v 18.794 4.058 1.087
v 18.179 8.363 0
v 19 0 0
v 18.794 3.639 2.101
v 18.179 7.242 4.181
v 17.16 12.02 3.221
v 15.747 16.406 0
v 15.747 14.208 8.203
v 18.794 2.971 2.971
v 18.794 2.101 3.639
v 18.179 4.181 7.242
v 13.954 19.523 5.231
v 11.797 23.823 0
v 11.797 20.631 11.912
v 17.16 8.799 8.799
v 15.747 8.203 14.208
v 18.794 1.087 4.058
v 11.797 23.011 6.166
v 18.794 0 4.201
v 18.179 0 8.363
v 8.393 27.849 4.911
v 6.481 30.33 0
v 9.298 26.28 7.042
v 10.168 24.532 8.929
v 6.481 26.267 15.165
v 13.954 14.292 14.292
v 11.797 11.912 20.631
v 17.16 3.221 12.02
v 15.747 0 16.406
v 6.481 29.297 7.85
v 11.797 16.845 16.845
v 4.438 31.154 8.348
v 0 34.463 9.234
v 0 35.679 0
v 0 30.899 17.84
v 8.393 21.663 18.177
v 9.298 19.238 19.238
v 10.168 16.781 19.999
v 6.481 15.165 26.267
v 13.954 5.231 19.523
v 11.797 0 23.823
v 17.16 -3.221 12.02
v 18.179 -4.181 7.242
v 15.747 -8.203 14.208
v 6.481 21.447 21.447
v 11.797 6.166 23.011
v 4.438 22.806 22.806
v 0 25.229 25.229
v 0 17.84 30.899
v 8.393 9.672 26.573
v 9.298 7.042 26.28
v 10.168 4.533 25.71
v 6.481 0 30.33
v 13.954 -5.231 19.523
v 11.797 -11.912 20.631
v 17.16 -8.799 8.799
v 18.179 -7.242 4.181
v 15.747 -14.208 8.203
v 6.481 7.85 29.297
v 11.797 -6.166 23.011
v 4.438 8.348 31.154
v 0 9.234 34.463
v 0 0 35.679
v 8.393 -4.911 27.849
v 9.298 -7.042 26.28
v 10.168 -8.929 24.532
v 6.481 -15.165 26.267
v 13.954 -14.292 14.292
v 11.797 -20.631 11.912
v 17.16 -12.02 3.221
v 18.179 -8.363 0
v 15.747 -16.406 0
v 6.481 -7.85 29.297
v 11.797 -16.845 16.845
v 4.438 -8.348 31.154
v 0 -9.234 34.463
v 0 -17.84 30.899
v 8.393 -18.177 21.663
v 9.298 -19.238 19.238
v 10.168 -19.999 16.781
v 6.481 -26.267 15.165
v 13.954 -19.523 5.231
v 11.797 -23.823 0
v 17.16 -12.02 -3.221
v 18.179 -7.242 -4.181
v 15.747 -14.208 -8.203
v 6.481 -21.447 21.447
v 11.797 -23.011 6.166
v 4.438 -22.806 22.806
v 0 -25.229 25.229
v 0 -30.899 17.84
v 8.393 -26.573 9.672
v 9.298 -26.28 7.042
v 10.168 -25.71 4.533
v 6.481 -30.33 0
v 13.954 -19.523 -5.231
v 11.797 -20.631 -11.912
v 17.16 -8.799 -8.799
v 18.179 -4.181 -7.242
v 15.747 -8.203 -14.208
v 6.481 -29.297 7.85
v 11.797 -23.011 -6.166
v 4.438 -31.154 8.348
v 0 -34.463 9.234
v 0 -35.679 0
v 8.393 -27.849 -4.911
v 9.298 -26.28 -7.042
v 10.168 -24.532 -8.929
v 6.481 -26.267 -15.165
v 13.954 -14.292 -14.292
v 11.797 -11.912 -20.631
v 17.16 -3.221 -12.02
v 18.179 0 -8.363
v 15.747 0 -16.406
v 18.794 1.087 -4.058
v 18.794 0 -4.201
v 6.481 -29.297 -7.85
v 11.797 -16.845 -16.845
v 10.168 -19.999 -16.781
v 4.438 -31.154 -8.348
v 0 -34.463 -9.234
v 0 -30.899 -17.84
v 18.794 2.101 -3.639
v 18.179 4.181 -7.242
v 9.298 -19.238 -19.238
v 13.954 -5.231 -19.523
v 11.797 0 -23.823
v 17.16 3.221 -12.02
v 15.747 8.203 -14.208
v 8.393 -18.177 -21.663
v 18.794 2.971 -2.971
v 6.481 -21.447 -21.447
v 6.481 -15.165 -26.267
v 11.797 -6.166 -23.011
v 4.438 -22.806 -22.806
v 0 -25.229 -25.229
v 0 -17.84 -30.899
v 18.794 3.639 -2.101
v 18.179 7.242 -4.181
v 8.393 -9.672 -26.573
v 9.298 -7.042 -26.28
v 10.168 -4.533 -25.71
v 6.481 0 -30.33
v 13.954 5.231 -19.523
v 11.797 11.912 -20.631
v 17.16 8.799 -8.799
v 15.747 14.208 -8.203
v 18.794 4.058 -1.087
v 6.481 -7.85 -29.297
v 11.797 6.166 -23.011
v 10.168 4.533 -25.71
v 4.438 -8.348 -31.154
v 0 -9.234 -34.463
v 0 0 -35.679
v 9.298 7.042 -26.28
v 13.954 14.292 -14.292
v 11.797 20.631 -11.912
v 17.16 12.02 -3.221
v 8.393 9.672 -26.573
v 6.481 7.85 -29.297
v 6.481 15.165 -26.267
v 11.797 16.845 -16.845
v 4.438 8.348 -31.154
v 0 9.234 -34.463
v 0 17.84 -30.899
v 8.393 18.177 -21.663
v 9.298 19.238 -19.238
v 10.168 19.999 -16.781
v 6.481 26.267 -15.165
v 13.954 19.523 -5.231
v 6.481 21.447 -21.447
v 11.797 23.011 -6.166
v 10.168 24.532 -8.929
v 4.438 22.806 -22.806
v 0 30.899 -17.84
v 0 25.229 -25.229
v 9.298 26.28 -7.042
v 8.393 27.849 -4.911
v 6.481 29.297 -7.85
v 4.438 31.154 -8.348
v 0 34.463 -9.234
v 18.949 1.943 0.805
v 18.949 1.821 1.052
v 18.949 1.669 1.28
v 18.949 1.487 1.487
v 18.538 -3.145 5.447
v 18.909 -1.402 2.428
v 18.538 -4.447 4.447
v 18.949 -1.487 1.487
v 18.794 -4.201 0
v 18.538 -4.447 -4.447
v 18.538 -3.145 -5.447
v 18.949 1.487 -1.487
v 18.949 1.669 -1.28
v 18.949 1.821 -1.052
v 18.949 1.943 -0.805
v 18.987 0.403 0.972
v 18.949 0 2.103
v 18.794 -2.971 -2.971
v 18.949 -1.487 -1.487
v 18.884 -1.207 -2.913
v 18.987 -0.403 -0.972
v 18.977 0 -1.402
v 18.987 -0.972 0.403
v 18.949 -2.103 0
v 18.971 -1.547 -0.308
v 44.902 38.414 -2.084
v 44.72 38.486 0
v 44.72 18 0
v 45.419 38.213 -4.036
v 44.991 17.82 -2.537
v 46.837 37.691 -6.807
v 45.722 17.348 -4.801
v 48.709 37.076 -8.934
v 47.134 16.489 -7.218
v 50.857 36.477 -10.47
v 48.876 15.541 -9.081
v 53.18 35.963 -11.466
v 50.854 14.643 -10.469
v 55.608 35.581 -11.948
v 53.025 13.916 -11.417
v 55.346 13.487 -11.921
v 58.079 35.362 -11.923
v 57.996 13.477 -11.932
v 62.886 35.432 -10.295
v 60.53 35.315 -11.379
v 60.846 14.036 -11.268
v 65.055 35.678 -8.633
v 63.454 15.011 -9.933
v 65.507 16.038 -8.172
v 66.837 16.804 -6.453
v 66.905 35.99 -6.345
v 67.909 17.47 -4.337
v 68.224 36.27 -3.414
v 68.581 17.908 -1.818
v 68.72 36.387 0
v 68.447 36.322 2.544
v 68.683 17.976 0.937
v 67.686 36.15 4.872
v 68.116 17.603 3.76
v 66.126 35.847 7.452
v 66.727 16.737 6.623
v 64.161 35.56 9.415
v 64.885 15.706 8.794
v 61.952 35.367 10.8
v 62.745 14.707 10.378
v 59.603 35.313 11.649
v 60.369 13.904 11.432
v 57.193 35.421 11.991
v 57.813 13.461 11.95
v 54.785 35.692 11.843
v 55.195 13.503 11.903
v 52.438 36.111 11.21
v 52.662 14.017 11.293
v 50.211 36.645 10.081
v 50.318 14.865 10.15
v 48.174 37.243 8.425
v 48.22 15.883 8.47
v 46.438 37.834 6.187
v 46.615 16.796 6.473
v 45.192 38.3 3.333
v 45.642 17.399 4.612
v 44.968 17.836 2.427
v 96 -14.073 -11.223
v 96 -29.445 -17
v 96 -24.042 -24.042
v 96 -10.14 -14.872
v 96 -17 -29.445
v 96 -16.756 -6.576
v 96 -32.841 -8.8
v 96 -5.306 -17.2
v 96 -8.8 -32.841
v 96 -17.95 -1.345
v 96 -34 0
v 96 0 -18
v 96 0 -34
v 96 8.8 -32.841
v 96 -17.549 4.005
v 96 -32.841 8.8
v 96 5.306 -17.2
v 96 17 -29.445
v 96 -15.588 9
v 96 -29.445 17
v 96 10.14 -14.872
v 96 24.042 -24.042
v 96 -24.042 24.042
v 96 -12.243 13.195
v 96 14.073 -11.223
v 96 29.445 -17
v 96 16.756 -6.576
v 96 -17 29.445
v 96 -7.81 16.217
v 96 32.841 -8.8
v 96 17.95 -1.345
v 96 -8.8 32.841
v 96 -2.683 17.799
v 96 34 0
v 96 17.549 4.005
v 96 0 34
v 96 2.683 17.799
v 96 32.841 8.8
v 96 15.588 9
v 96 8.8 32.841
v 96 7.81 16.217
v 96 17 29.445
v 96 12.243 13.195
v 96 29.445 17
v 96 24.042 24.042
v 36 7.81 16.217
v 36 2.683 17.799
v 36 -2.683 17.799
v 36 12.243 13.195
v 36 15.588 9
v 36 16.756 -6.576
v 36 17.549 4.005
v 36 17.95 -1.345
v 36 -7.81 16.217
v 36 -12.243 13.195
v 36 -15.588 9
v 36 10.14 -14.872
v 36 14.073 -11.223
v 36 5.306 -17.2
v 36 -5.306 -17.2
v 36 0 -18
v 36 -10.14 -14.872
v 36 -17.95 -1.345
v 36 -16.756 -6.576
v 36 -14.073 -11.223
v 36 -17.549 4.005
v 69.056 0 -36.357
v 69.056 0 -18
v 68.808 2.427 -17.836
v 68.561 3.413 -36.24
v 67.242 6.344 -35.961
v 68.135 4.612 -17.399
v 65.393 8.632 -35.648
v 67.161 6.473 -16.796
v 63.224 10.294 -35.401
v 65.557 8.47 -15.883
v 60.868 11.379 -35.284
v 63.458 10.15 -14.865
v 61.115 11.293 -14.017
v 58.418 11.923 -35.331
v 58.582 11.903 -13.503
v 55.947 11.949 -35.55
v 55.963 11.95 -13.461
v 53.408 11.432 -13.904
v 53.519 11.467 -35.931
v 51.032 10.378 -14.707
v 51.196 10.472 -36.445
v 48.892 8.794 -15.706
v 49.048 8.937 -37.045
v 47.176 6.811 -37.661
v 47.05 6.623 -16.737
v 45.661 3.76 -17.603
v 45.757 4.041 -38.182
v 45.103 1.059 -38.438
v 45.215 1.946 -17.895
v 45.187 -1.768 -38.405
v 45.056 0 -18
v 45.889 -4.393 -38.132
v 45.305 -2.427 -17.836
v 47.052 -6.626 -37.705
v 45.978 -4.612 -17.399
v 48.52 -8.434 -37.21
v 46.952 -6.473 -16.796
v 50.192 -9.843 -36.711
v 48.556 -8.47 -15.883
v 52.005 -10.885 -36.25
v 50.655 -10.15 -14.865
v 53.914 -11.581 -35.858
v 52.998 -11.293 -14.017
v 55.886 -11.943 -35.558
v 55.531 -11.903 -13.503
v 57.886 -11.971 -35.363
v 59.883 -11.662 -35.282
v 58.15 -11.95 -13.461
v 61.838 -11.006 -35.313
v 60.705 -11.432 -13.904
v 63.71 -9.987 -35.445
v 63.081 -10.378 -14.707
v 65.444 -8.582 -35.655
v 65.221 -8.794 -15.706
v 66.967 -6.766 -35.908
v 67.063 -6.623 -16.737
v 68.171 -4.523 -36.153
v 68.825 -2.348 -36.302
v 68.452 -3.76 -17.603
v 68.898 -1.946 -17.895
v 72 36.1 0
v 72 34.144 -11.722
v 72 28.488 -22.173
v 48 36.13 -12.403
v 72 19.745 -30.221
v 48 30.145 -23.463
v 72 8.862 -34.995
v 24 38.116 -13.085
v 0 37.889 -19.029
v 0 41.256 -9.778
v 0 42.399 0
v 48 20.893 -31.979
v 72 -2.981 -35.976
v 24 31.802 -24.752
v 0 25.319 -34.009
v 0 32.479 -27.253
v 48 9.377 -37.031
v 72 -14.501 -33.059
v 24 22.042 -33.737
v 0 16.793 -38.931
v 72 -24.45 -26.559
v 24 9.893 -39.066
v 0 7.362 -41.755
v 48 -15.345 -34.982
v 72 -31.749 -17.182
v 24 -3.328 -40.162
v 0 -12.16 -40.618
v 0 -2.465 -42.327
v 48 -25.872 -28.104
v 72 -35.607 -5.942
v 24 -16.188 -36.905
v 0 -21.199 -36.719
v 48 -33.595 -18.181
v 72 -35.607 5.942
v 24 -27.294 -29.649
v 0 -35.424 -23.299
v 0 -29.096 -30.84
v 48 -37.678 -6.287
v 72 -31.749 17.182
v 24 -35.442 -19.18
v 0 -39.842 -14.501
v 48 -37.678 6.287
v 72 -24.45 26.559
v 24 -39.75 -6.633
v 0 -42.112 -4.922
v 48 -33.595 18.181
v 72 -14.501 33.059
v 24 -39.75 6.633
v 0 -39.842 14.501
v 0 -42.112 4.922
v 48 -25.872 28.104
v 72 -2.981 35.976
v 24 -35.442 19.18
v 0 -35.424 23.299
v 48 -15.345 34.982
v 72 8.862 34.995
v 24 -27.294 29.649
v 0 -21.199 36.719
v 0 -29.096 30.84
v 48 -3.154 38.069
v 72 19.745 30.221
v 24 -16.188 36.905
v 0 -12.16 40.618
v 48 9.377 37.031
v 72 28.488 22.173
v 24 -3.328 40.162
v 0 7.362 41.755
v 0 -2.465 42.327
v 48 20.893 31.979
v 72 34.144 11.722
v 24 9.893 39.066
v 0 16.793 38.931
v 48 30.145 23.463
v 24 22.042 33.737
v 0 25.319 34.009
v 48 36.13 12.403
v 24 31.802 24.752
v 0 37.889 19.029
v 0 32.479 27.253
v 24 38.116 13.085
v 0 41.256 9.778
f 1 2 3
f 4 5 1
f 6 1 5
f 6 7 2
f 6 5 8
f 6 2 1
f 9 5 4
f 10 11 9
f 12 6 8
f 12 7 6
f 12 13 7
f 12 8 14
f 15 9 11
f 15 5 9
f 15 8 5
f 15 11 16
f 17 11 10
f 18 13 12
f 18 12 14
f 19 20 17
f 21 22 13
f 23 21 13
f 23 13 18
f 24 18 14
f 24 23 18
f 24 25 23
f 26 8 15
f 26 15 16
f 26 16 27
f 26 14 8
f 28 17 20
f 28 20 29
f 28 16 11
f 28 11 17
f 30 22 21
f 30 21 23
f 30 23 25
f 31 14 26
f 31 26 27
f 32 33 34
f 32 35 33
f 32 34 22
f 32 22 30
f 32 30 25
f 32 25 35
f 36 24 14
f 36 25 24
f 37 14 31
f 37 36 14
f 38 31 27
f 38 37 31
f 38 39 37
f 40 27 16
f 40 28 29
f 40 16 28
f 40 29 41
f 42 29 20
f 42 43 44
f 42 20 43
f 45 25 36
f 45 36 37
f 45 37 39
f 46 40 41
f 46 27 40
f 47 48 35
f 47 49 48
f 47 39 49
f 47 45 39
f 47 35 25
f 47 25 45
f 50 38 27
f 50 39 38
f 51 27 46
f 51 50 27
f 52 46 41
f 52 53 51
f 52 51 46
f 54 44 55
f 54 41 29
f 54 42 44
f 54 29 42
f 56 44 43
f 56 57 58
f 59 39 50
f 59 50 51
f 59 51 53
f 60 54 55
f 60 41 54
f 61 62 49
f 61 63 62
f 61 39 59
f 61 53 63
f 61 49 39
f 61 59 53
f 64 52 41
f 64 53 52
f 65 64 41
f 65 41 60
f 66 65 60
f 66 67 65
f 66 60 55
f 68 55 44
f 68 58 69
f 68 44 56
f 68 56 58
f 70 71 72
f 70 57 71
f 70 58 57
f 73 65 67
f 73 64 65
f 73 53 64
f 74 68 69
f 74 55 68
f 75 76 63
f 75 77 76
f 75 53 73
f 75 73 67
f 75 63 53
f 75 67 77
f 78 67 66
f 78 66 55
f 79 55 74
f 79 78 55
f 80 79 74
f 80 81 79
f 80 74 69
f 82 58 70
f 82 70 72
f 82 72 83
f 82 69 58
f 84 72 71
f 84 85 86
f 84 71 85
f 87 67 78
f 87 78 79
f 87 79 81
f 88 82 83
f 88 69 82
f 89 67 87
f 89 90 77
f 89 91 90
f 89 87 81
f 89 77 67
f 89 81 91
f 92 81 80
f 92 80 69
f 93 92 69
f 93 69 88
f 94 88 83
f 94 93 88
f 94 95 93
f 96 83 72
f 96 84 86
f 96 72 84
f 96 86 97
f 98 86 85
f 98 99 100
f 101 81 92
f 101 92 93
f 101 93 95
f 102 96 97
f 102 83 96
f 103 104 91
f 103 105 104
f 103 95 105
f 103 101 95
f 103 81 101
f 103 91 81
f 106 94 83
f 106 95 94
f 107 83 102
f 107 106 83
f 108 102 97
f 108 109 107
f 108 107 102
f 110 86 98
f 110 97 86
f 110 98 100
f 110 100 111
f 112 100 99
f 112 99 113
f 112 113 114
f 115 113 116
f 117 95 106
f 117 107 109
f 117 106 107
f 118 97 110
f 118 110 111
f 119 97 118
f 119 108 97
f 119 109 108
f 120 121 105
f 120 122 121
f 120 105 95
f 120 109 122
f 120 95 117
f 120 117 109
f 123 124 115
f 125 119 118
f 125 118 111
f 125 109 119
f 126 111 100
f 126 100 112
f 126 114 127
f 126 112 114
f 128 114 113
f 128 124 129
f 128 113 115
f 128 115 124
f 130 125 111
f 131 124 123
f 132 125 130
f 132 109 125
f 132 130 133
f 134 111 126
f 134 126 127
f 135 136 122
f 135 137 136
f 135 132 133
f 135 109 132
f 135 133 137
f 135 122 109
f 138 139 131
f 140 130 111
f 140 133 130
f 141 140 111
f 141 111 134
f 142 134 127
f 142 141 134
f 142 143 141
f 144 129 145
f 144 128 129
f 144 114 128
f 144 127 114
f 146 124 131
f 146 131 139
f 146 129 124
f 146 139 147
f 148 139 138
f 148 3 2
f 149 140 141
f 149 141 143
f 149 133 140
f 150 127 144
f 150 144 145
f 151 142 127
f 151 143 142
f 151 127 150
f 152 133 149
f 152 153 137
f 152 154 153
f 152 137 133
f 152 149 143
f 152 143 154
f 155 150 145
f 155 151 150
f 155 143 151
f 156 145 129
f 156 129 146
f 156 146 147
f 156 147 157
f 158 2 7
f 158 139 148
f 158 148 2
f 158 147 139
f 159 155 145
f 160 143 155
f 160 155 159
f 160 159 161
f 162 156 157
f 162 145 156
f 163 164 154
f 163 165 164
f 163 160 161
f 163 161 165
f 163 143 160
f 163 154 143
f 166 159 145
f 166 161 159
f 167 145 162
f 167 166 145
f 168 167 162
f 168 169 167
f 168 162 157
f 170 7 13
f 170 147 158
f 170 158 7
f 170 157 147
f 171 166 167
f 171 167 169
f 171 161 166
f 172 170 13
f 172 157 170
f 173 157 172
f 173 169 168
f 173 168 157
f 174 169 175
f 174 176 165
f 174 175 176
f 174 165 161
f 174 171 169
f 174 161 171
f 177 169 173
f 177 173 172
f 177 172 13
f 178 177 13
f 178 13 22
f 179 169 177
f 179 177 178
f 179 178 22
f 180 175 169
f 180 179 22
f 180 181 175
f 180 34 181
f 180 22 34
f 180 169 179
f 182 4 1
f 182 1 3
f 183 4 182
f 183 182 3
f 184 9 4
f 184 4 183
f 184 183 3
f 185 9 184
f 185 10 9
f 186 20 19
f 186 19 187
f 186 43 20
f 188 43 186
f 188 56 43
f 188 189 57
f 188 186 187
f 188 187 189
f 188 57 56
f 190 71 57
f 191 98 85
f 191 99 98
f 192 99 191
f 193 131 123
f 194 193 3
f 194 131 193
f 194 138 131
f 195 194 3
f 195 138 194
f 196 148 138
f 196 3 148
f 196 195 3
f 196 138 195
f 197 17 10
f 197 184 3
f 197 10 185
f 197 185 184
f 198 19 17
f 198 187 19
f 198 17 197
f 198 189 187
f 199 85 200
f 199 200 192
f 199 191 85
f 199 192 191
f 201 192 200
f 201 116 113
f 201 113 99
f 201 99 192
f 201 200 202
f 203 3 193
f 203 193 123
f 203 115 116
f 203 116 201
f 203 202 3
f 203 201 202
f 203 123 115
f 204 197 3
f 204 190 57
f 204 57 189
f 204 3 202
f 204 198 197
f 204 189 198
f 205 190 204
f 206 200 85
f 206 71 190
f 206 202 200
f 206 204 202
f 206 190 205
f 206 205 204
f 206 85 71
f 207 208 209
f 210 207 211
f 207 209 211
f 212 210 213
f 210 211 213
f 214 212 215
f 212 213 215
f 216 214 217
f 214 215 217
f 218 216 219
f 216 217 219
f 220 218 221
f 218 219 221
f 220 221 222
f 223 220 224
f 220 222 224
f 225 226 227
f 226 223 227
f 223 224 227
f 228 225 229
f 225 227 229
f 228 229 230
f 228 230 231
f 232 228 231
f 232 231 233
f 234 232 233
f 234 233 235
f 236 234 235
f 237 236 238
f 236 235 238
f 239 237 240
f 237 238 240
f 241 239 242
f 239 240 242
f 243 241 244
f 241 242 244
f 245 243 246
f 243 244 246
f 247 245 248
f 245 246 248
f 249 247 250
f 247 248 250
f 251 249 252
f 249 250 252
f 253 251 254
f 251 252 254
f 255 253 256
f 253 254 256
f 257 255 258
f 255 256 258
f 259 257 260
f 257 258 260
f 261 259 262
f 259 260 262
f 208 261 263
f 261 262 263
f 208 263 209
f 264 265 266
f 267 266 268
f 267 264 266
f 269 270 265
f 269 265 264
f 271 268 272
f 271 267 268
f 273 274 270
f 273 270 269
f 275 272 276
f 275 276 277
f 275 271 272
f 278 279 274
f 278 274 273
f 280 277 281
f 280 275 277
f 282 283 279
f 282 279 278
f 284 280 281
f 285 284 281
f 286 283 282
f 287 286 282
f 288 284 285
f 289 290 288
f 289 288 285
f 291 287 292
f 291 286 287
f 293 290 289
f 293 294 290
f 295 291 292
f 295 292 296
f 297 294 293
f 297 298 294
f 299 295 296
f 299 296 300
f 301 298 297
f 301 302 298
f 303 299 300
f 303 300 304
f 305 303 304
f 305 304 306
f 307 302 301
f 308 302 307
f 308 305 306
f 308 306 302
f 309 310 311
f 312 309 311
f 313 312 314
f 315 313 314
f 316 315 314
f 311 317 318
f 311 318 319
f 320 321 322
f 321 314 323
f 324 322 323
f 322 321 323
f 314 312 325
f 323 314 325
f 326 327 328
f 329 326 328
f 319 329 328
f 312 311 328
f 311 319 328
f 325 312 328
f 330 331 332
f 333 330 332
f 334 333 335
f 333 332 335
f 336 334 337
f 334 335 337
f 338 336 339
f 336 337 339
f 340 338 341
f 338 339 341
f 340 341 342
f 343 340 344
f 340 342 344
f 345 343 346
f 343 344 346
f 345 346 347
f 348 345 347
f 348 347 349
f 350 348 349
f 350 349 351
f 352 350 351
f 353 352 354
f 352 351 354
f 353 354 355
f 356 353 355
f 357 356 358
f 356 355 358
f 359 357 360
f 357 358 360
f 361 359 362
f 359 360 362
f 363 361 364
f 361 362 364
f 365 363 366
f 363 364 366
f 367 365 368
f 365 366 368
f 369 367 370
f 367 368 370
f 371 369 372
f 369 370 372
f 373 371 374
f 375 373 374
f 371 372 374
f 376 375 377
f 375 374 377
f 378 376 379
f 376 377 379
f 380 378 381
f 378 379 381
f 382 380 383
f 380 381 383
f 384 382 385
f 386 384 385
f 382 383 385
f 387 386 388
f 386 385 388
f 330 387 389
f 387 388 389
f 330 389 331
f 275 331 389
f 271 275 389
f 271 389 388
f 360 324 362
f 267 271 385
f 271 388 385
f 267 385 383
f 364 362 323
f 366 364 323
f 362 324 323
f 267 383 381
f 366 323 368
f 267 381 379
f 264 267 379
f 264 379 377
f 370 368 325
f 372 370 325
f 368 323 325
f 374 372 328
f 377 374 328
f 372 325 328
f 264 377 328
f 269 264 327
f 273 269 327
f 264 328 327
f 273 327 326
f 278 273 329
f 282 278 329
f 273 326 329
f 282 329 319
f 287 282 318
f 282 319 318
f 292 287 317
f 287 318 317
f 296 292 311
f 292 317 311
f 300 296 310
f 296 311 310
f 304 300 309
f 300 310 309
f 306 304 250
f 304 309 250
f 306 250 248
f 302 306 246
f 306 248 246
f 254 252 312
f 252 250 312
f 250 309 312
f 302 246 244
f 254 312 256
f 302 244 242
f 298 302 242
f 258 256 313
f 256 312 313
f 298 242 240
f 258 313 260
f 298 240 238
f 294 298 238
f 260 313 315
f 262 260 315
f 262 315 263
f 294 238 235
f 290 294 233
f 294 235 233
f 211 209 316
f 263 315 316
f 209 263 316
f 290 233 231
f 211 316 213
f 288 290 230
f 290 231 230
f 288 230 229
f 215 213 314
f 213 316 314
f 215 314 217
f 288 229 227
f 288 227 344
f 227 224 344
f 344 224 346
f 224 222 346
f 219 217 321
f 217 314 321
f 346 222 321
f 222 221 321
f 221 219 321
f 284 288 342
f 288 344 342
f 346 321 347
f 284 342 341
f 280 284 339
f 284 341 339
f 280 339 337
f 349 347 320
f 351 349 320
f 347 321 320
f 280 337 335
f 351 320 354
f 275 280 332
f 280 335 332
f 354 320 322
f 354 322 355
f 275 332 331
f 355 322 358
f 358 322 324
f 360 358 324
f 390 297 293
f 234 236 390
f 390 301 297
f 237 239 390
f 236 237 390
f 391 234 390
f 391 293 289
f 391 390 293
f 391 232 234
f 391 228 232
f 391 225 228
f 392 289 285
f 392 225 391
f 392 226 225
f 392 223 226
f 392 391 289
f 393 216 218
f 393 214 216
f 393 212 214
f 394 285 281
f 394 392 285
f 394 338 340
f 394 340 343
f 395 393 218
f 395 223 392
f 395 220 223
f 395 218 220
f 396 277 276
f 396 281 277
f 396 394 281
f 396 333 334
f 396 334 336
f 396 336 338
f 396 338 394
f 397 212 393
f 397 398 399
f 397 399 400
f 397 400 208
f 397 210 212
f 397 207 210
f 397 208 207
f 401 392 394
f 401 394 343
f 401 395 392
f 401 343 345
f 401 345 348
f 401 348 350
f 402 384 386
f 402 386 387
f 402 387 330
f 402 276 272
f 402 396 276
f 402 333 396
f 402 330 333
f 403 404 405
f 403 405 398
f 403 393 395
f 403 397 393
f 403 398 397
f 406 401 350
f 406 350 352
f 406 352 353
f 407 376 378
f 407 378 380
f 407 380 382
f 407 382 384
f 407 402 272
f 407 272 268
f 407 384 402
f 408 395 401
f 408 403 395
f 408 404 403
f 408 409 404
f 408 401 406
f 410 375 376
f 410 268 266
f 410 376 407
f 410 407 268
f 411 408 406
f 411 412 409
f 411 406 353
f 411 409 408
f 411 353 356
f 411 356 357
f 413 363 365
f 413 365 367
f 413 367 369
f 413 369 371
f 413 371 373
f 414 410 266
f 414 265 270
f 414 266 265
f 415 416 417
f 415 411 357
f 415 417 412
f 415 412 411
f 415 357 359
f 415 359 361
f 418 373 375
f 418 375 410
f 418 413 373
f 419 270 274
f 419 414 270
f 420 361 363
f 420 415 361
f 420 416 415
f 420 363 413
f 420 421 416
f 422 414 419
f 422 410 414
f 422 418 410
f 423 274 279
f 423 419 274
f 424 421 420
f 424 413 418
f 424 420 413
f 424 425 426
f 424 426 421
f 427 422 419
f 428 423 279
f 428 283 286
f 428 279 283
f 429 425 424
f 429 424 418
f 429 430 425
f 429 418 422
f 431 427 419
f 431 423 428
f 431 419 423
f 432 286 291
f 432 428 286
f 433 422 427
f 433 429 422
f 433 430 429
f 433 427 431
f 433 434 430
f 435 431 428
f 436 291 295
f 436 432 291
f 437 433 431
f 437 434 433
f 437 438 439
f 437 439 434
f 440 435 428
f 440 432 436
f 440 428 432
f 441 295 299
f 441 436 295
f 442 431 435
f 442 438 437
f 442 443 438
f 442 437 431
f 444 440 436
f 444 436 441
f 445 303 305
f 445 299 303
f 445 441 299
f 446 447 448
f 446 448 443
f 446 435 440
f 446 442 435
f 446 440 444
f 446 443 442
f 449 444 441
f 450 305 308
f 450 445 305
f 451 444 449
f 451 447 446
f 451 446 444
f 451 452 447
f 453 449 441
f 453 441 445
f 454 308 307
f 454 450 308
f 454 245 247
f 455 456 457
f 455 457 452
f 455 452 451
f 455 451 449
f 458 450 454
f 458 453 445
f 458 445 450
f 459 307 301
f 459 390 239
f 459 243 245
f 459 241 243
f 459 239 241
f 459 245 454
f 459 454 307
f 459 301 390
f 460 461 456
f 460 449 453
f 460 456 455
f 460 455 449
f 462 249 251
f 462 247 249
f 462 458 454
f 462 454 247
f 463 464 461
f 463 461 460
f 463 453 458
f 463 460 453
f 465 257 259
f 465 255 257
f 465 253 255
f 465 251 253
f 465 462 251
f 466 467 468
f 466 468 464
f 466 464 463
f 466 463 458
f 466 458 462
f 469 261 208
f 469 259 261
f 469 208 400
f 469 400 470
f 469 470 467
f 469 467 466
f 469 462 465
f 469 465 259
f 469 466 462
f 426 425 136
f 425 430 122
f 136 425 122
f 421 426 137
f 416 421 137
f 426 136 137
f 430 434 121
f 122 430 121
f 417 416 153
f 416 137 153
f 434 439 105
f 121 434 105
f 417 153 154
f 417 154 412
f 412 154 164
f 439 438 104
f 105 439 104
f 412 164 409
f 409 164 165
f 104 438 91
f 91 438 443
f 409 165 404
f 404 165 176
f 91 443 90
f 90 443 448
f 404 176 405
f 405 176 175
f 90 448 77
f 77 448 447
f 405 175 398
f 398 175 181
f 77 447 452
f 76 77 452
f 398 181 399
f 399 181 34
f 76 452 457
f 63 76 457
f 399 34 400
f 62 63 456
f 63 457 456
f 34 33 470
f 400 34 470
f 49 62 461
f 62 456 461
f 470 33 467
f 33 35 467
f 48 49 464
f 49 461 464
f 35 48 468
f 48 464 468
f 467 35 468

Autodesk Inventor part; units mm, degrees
ref_plane "YZ Plane" through (0, 0, 0) normal (1, 0, 0) x (0, 1, 0)
ref_plane "XZ Plane" through (0, 0, 0) normal (0, 1, 0) x (-1, 0, 0)
ref_plane "XY Plane" through (0, 0, 0) normal (0, 0, 1) x (1, 0, 0)
sketch "草图1" plane through (0, 0, 0) normal (0, 0, 1) x (1, 0, 0)
  arc A0 (19, 0) -> (0, 35.6791) centre (-24, 0) ccw
  line L0 (96, 34) -> (96, 0)
  line L1 (96, 34) -> (0, 42.3989)
  line L2 (-101.2978, 0) -> (181.6605, 0)
  line L3 (0, 42.3989) -> (0, 35.6791)
  point P0 (0, 0)
  dimension "d0" = 24
  dimension "d1" = 86
  dimension "d2" = 34
  dimension "d4" = 5
revolve "旋转1" add sketch "草图1" angle 360 about axis through (-101.2978, 0, 0) along (1, 0, 0)
sketch "草图2" plane through (96, 0, 0) normal (1, 0, 0) x (0, 0, -1)
  circle A0 centre (0, 0) radius 34 projected
  point P0 (0, 0)
hole "孔1" at (96, 0, 0) direction (-1, 0, 0) diameter 36 depth 60
sketch "草图3" plane through (0, 0, 0) normal (0, 1, 0) x (-1, 0, 0)
  circle A0 centre (-56.72, 0) radius 12
  line L0 (-96, 34) -> (-96, -34) projected
  point P0 (0, 0)
  dimension "d13" = 24
  dimension "d14" = 39.28
extrude "拉伸1" cut sketch "草图3" along normal up to surface
sketch "草图4" plane through (0, 0, 0) normal (0, 0, 1) x (1, 0, 0)
  line L0 (96, 18) -> (96, -18) projected
  line L1 (36, -18) -> (36, 18) projected
  circle A0 centre (57.0565, 0) radius 12
  point P0 (0, 0)
  point P1 (56.72, 13.4164)
  point P2 (56.72, 13.4164)
  point P3 (57.0565, 35.4317)
  dimension "d17" = 24
extrude "拉伸2" cut sketch "草图4" against normal up to surface
properties part number "旋塞" material "不锈钢"
